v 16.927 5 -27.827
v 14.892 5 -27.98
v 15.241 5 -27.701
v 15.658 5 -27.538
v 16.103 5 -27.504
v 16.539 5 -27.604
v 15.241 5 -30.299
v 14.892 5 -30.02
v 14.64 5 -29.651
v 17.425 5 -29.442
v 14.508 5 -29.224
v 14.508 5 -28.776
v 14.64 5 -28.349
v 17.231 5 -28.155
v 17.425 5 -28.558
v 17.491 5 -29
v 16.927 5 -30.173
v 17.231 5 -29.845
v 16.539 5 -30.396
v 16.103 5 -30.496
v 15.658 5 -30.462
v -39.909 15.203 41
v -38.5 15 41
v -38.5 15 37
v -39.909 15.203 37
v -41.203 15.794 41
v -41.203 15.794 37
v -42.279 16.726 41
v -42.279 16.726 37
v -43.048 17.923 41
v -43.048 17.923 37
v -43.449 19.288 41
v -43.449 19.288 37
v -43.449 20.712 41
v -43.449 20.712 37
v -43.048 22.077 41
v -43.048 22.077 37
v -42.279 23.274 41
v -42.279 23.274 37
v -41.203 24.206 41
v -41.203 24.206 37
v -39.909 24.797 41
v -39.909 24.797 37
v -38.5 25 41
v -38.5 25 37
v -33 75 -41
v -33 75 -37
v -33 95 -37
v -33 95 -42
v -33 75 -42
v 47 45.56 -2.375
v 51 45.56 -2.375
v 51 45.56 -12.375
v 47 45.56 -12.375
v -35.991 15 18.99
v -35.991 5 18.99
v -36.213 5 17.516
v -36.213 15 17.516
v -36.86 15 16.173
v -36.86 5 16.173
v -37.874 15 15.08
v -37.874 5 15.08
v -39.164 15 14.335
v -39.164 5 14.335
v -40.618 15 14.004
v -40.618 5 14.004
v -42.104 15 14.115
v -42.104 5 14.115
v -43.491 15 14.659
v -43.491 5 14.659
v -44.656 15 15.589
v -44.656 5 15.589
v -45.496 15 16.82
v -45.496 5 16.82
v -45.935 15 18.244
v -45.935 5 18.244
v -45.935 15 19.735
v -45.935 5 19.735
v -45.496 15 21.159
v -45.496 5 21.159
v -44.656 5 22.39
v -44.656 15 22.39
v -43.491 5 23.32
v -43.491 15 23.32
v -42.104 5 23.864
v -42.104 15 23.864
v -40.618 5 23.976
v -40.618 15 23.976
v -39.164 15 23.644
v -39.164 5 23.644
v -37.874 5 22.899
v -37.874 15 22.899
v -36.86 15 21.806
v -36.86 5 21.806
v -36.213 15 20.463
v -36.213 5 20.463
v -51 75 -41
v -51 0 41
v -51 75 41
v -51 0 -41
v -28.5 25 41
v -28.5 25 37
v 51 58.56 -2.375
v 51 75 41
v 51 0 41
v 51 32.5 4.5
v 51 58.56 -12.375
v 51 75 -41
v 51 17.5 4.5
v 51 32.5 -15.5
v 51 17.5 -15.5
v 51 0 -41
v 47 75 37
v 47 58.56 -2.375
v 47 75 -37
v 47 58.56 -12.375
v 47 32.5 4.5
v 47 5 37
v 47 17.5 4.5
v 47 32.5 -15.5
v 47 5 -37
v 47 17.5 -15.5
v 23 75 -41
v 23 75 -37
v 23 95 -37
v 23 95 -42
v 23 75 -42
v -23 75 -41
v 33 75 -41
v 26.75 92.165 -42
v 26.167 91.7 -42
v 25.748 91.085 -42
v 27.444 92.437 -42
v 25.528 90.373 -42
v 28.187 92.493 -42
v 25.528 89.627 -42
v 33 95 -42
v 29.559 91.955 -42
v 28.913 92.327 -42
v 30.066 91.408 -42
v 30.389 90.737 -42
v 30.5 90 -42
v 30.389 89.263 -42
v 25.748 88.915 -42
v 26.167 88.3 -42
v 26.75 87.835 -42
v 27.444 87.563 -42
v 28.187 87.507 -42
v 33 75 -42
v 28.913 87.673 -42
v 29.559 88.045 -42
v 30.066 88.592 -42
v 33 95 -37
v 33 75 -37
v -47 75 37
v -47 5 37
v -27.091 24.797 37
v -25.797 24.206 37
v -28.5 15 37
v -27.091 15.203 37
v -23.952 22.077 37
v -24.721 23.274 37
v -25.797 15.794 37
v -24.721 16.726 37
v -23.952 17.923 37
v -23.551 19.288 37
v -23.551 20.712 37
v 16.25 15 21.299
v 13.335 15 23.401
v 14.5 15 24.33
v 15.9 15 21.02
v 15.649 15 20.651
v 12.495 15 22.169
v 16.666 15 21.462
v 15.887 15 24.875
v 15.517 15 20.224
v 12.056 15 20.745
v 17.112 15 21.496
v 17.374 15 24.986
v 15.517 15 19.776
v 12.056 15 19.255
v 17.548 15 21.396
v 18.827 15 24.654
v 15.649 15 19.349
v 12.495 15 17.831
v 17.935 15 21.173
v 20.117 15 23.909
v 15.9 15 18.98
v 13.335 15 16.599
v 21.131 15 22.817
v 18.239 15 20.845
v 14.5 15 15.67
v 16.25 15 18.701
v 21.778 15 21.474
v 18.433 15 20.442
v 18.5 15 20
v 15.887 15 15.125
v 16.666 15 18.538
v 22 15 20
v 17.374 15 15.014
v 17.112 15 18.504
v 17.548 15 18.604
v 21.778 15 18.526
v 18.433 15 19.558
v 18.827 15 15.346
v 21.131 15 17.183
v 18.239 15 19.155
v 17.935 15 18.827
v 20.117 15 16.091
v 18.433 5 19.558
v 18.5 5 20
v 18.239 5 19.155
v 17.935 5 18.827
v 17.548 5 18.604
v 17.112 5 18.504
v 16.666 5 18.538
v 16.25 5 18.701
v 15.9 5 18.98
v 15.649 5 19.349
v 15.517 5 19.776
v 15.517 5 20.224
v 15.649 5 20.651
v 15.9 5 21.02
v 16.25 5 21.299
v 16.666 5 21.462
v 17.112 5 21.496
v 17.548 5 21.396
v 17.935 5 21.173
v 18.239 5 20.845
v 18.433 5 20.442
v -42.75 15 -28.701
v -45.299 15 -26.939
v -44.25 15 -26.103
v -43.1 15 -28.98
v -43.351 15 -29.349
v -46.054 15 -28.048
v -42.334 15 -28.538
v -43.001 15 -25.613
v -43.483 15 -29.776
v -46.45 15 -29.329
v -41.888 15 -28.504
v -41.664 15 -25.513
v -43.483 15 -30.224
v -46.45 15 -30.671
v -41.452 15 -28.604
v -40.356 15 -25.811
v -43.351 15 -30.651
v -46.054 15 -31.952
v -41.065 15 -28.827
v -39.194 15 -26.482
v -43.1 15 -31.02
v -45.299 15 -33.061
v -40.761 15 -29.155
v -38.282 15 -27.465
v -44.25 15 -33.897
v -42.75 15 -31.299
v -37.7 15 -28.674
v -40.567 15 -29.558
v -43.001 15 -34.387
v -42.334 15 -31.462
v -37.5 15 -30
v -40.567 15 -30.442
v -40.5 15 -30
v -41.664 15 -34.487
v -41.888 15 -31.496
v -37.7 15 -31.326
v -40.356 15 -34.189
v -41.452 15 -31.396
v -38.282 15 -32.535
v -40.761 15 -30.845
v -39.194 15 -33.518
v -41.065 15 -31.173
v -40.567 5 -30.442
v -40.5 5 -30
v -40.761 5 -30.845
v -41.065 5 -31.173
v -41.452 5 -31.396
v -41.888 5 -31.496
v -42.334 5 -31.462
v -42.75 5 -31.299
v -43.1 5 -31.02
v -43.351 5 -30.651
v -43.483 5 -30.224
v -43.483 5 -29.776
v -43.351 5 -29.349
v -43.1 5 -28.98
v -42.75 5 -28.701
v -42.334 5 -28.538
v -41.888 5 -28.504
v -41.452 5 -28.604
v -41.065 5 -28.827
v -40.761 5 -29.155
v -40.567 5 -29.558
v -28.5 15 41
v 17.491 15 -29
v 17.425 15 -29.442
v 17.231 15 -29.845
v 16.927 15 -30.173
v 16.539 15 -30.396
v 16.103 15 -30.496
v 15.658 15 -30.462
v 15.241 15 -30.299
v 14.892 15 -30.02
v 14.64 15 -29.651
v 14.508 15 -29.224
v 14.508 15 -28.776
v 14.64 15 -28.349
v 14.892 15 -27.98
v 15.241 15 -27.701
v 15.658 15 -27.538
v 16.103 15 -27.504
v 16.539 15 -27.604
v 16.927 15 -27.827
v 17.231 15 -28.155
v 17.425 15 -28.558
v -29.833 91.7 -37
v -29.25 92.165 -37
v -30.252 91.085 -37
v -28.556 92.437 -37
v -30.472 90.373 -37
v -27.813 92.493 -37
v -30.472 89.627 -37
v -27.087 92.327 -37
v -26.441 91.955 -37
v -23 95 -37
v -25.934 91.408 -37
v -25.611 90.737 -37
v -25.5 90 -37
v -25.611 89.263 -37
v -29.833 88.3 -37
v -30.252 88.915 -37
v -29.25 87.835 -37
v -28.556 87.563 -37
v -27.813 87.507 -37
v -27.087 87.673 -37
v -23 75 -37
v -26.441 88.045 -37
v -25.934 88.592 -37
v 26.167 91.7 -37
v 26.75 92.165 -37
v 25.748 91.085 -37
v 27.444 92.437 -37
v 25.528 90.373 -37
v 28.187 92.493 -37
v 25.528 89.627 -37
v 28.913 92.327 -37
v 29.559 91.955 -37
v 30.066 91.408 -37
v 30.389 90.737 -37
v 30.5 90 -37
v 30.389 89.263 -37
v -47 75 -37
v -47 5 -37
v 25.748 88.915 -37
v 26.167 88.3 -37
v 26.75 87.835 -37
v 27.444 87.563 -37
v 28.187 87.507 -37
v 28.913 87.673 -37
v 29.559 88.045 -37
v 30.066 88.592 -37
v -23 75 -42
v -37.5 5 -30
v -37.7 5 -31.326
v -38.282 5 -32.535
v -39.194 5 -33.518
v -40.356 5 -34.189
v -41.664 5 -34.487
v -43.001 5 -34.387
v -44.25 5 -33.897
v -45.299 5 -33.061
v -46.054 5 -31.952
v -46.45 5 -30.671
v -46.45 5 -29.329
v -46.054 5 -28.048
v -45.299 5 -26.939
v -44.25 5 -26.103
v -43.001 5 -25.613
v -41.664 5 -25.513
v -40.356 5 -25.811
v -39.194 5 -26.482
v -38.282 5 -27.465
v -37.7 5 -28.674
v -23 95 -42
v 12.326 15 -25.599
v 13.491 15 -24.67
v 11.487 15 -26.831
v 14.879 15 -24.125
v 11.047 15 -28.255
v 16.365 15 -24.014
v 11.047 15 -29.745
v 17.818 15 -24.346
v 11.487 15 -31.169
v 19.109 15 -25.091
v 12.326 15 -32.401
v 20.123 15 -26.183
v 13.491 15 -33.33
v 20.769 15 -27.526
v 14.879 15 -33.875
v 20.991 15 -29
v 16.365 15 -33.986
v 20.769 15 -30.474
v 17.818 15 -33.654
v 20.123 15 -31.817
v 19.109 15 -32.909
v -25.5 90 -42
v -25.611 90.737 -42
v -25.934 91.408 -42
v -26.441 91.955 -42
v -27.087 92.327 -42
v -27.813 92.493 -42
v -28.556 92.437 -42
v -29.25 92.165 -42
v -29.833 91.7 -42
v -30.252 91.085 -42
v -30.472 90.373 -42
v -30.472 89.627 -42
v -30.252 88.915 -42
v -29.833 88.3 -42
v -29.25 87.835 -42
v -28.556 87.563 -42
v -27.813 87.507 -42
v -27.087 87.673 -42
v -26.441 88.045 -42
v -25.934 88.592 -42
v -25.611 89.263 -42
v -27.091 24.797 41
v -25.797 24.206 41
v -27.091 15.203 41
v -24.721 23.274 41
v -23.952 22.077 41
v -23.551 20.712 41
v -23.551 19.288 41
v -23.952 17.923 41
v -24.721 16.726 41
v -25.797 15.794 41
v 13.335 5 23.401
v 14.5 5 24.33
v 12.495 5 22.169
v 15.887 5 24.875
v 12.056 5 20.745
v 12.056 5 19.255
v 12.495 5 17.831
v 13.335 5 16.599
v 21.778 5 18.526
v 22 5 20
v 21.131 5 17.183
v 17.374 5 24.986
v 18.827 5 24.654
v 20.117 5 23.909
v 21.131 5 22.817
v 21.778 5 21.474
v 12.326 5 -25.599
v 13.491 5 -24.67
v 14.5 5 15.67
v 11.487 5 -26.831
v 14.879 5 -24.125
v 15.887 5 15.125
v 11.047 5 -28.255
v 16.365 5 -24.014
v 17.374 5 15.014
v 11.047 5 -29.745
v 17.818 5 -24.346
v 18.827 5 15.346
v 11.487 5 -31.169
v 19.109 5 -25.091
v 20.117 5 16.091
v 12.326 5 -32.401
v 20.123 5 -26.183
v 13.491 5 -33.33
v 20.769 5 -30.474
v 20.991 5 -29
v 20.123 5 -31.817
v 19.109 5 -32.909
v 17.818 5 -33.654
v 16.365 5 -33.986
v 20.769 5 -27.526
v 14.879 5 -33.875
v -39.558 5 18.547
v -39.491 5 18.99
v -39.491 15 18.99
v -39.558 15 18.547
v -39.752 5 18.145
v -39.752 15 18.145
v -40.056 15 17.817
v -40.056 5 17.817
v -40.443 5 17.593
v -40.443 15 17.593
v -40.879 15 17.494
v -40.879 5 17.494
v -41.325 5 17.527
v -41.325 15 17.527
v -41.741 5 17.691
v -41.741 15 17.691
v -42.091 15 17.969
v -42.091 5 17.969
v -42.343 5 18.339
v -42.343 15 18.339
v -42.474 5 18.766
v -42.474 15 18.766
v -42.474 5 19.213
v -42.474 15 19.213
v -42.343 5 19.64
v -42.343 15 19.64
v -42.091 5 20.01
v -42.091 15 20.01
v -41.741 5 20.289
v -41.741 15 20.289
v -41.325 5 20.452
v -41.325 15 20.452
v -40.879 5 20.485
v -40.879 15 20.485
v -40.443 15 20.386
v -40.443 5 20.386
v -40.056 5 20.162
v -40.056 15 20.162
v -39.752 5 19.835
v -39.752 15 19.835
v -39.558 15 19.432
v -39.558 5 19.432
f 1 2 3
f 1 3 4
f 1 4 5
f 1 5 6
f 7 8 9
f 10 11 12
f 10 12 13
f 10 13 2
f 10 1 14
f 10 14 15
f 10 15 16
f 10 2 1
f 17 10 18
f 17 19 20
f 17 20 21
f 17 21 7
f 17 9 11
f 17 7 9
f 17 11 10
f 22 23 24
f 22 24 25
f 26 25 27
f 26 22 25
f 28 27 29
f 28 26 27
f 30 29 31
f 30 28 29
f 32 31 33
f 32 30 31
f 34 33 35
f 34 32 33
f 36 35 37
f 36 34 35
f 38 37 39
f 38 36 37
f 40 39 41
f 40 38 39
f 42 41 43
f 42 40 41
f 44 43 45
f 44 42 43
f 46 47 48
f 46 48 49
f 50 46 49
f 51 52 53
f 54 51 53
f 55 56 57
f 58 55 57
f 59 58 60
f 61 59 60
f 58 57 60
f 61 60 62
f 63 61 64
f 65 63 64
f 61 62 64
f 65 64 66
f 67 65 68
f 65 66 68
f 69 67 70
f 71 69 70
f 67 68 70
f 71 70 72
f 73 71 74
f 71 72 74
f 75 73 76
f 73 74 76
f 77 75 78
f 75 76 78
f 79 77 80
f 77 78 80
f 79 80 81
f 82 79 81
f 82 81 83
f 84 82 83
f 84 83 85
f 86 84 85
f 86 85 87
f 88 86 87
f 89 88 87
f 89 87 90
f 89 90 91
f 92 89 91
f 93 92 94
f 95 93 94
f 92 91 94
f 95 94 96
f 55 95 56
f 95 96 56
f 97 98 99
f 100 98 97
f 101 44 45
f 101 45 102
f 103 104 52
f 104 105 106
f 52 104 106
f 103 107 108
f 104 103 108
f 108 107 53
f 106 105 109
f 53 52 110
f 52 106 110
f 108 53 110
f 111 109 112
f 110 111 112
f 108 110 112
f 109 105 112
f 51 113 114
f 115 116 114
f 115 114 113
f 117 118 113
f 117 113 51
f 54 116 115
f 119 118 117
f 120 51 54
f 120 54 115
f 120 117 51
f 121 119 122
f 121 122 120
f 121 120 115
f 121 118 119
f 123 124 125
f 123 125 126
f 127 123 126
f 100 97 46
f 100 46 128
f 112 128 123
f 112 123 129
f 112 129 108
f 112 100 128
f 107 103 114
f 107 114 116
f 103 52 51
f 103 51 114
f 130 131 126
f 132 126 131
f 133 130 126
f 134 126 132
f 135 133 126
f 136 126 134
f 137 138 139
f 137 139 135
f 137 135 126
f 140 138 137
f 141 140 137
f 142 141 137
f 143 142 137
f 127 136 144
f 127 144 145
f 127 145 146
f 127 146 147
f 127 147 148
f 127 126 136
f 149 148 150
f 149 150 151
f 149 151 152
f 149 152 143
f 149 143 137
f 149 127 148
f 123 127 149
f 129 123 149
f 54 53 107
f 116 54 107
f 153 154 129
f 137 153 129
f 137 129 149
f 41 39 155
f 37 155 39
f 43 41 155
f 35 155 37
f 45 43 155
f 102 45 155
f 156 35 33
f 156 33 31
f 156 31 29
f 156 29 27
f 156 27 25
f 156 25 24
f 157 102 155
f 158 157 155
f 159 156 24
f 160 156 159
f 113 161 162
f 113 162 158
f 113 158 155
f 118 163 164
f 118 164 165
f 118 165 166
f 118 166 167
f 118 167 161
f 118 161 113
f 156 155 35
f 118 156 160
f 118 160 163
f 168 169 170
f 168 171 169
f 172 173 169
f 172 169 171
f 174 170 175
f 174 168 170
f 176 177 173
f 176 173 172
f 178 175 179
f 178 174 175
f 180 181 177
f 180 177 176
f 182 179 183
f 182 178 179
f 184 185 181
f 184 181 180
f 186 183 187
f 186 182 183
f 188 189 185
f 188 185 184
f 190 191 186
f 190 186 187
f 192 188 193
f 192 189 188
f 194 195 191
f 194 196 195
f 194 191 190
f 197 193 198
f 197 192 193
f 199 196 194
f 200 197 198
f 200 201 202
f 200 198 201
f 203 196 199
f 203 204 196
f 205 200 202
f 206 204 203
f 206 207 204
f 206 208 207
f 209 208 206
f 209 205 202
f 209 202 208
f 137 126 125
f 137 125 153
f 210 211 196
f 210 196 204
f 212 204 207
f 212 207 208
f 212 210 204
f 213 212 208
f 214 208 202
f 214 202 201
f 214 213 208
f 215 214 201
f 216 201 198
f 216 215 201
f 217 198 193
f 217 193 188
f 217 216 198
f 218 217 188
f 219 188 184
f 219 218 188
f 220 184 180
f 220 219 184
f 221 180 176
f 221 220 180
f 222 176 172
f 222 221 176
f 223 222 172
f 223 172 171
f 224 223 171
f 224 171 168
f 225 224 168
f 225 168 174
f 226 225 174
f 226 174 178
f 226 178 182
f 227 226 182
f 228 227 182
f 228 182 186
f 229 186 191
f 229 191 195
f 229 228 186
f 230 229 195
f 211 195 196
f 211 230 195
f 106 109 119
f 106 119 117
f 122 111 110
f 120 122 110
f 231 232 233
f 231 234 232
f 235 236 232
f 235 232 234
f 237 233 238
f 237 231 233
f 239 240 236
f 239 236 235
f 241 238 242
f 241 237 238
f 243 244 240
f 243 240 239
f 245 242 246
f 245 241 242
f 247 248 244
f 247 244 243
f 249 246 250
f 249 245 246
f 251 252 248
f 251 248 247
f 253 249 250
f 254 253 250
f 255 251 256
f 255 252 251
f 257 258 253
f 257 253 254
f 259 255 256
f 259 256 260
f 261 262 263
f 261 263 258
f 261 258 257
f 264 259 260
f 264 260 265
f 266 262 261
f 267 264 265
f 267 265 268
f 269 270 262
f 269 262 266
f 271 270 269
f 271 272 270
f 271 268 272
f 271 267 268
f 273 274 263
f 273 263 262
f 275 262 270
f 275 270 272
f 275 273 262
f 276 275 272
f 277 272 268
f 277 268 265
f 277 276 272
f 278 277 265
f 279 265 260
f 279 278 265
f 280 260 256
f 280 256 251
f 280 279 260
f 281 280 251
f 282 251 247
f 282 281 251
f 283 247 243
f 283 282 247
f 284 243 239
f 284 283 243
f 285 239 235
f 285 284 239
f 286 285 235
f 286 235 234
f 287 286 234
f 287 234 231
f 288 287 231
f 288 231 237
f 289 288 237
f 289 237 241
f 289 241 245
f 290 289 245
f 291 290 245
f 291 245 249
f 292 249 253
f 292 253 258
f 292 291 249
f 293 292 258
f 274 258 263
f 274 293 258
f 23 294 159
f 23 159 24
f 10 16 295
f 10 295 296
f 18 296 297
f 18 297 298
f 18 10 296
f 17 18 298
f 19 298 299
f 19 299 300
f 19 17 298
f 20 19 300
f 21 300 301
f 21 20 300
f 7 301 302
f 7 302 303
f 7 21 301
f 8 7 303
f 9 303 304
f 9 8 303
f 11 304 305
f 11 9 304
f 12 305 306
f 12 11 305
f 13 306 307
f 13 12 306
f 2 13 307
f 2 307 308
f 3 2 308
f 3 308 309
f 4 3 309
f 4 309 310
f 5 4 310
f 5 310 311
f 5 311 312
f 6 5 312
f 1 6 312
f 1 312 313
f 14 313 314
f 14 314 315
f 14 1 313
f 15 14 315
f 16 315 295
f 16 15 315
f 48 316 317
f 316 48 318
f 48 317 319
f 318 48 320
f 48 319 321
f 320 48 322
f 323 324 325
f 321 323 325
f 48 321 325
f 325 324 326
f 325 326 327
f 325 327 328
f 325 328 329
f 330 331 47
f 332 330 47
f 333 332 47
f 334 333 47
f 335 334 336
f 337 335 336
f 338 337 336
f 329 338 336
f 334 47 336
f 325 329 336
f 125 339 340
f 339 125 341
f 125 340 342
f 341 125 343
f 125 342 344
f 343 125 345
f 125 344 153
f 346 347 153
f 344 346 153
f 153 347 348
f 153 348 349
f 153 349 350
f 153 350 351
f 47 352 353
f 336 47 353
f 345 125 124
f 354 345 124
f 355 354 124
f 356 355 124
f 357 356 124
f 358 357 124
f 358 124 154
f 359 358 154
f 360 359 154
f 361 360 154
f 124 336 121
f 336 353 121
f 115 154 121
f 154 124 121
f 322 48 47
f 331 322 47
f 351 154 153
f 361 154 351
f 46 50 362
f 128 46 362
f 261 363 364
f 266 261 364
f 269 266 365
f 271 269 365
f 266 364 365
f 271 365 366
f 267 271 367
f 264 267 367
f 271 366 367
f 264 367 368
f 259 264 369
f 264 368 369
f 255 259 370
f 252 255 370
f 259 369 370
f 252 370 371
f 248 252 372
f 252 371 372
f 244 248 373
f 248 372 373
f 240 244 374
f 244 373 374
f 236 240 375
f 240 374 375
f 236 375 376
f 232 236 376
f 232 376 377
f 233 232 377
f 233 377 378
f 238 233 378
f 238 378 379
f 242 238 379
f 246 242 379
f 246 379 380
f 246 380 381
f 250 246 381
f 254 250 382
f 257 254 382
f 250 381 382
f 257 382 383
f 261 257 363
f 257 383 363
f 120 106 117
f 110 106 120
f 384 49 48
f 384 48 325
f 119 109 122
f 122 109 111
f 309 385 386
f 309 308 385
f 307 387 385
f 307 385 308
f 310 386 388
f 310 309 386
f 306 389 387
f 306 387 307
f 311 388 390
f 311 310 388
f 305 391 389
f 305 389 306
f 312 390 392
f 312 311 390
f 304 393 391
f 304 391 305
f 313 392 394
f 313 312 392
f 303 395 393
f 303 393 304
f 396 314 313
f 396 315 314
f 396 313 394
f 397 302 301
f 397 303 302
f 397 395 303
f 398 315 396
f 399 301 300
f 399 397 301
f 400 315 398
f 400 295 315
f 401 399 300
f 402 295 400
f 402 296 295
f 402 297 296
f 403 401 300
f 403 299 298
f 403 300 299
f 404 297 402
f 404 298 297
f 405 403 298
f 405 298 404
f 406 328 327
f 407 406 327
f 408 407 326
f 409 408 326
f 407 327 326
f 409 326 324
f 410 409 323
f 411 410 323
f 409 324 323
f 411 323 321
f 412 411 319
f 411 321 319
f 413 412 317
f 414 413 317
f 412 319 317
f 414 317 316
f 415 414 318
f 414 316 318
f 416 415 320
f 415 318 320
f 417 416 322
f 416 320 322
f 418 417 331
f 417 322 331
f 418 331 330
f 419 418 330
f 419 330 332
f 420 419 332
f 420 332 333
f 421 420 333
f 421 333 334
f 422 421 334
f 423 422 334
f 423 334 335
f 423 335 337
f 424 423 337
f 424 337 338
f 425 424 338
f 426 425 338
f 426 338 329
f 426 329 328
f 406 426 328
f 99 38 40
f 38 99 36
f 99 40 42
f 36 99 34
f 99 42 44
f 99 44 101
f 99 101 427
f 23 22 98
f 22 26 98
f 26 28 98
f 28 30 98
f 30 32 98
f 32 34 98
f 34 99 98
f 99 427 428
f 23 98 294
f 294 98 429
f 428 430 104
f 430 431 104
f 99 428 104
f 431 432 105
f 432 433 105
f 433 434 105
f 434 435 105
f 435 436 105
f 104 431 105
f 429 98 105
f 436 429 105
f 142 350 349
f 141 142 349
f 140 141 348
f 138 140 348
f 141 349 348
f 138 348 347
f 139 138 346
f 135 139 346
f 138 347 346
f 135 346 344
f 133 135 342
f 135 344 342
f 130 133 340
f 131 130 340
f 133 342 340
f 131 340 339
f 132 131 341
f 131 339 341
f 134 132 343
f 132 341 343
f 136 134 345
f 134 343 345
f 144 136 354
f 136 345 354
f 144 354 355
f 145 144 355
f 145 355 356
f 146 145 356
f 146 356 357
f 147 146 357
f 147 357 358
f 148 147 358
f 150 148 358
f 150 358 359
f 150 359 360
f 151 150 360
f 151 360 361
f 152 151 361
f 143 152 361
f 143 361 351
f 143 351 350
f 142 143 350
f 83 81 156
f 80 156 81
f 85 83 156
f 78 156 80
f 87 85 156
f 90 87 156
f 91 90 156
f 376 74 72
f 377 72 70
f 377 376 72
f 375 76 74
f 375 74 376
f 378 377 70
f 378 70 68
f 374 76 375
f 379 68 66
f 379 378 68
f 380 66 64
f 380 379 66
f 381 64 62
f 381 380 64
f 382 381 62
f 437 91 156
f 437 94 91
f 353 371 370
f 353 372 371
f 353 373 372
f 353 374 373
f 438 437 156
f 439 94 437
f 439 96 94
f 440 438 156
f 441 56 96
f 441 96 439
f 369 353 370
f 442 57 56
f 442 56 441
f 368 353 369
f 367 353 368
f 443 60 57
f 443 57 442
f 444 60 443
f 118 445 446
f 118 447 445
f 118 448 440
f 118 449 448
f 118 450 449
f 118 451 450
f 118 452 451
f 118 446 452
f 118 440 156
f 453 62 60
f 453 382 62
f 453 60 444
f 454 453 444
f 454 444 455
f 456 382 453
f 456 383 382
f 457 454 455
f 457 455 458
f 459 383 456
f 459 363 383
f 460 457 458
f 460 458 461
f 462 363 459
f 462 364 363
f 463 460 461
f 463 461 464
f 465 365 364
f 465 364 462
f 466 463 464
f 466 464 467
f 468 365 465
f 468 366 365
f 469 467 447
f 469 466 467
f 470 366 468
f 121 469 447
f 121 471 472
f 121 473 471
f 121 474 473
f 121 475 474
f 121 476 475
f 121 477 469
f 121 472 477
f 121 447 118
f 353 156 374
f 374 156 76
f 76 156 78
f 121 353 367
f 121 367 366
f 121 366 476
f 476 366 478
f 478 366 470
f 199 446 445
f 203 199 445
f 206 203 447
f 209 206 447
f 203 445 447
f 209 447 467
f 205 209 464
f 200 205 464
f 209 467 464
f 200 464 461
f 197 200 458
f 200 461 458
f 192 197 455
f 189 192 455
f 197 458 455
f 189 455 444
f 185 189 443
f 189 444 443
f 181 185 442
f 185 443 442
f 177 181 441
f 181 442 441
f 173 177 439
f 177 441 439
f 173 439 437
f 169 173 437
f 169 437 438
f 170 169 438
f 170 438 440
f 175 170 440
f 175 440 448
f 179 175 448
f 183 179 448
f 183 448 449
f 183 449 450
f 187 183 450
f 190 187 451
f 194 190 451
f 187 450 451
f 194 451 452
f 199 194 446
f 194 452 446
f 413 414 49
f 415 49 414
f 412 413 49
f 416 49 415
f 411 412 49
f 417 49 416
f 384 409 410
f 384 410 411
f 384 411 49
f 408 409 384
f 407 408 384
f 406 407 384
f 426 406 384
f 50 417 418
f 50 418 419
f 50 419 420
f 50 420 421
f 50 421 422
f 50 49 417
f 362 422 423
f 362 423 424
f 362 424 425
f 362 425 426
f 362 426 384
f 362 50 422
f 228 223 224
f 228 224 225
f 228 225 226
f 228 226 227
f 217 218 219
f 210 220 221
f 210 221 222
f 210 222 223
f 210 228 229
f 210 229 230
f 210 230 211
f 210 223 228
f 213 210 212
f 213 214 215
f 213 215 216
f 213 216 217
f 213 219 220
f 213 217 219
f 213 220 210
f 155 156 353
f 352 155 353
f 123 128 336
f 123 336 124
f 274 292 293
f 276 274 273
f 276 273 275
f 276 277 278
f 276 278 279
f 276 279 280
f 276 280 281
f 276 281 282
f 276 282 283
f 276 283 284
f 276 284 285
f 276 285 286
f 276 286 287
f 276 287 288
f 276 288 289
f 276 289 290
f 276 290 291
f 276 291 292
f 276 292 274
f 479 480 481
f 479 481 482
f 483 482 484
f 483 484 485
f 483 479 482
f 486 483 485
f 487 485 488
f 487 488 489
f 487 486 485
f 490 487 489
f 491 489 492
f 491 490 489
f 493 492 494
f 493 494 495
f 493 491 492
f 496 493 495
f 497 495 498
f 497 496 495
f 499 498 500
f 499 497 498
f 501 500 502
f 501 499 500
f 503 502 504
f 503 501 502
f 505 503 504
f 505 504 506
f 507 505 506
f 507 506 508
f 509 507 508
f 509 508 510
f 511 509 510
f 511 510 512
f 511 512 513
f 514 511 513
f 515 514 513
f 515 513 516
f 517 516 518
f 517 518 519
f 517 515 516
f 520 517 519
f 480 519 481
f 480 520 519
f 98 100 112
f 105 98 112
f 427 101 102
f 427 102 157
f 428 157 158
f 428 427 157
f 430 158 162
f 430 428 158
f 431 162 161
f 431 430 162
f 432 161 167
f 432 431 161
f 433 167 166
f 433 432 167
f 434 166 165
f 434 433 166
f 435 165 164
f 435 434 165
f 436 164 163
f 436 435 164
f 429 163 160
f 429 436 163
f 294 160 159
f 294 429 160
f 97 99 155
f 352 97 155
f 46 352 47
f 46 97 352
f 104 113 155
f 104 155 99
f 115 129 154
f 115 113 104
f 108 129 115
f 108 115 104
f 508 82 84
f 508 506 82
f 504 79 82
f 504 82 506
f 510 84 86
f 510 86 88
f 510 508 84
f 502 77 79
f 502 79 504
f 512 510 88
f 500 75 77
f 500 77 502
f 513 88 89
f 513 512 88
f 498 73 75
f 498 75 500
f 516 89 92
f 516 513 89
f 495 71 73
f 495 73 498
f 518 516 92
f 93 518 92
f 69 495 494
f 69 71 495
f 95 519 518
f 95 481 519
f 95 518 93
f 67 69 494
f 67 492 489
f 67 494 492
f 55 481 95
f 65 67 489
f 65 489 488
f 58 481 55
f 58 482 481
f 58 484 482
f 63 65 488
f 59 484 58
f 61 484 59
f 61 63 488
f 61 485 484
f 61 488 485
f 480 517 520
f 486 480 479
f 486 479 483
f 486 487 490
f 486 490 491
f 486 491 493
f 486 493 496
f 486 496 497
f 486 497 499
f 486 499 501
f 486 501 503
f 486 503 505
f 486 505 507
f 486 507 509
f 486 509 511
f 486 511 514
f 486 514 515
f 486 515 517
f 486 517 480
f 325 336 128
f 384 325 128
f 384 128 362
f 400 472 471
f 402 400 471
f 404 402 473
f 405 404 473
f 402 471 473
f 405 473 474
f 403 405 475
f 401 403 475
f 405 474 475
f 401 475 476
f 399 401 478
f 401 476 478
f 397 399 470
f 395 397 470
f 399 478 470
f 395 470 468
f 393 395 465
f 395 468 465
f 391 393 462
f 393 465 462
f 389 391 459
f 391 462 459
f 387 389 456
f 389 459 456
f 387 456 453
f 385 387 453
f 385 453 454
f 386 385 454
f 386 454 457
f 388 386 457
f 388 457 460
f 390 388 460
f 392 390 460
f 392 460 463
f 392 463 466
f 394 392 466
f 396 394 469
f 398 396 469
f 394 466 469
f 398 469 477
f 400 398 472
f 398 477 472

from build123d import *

# Parameters (mm, degrees)
SKETCH1_W           = 102
SKETCH1_H           = 82
BOSS_EXTRUDE1_DEPTH = 5
SKETCH2_W           = 102
SKETCH2_H           = 82
SKETCH2_W_2         = 94
SKETCH2_H_2         = 74
BOSS_EXTRUDE2_DEPTH = 70
CUT_EXTRUDE1_REACH  = 84
SKETCH9_W           = 20
SKETCH9_H           = 15
SKETCH9_W_2         = 10
SKETCH9_H_2         = 13
CUT_EXTRUDE7_DEPTH  = 10
SKETCH10_R          = 5
SKETCH10_R_2        = 4.5
BOSS_EXTRUDE5_DEPTH = 10
SKETCH11_R          = 1.5
CUT_EXTRUDE8_DEPTH  = 10
SKETCH13_W          = 10
SKETCH13_H          = 5
BOSS_EXTRUDE6_DEPTH = 20
SKETCH14_R          = 2.5
CUT_EXTRUDE9_DEPTH  = 10


with BuildPart() as part:
    # Sketch1 → Boss-Extrude1 (new body)
    with BuildSketch(Plane(origin=(0, 0, 0), x_dir=(1, 0, 0), z_dir=(0, 1, 0))):
        Rectangle(SKETCH1_W, SKETCH1_H)
    extrude(amount=BOSS_EXTRUDE1_DEPTH)

    # Sketch2 → Boss-Extrude2 (add)
    with BuildSketch(Plane(origin=(0, 5, 0), x_dir=(1, 0, 0), z_dir=(0, 1, 0))):
        Rectangle(SKETCH2_W, SKETCH2_H)
        Rectangle(SKETCH2_W_2, SKETCH2_H_2, mode=Mode.SUBTRACT)
    extrude(amount=BOSS_EXTRUDE2_DEPTH)

    # Sketch4 → Cut-Extrude1 (cut, up to next)
    with BuildSketch(Plane.XY.offset(41), mode=Mode.PRIVATE) as cut_extrude1_sk1:
        with BuildLine():
            Line((-38.5, 25), (-28.5, 25))
            ThreePointArc((-28.5, 25), (-23.5, 20), (-28.5, 15))
            Line((-28.5, 15), (-38.5, 15))
            ThreePointArc((-38.5, 15), (-43.5, 20), (-38.5, 25))
        make_face()
    cut_extrude1_tool1 = extrude(cut_extrude1_sk1.sketch, amount=-CUT_EXTRUDE1_REACH, mode=Mode.PRIVATE) & part.part
    add(cut_extrude1_tool1.solids().sort_by_distance((-33.5, 20, 41))[0], mode=Mode.SUBTRACT)

    # Sketch9 → Cut-Extrude7 (cut)
    with BuildSketch(Plane(origin=(51, 0, 0), x_dir=(0, 0, -1), z_dir=(1, 0, 0))):
        with Locations((5.5, 25)):
            Rectangle(SKETCH9_W, SKETCH9_H)
        with Locations((7.375245753, 52.06044871)):
            Rectangle(SKETCH9_W_2, SKETCH9_H_2)
    extrude(amount=-CUT_EXTRUDE7_DEPTH, mode=Mode.SUBTRACT)

    # Sketch10 → Boss-Extrude5 (add)
    with BuildSketch(Plane(origin=(0, 5, 0), x_dir=(1, 0, 0), z_dir=(0, 1, 0))):
        with Locations((17, -20)):
            Circle(SKETCH10_R)
        with Locations((-40.991198651, -18.989614408)):
            Circle(SKETCH10_R)
        with Locations((15.99137867, 29)):
            Circle(SKETCH10_R)
        with Locations((-42, 30)):
            Circle(SKETCH10_R_2)
    extrude(amount=BOSS_EXTRUDE5_DEPTH)

    # Sketch11 → Cut-Extrude8 (cut)
    with BuildSketch(Plane(origin=(0, 5, 0), x_dir=(1, 0, 0), z_dir=(0, 1, 0))):
        with Locations((-42, 30)):
            Circle(SKETCH11_R)
        with Locations((15.99137867, 29)):
            Circle(SKETCH11_R)
        with Locations((-40.991198651, -18.989614408)):
            Circle(SKETCH11_R)
        with Locations((17, -20)):
            Circle(SKETCH11_R)
    extrude(amount=CUT_EXTRUDE8_DEPTH, mode=Mode.SUBTRACT)

    # Sketch13 → Boss-Extrude6 (add)
    with BuildSketch(Plane(origin=(0, 75, 0), x_dir=(1, 0, 0), z_dir=(0, 1, 0))):
        with Locations((-28, 39.5)):
            Rectangle(SKETCH13_W, SKETCH13_H)
        with Locations((28, 39.5)):
            Rectangle(SKETCH13_W, SKETCH13_H)
    extrude(amount=BOSS_EXTRUDE6_DEPTH)

    # Sketch14 → Cut-Extrude9 (cut)
    with BuildSketch(Plane.XY.offset(-37)):
        with Locations((-28, 90)):
            Circle(SKETCH14_R)
        with Locations((28, 90)):
            Circle(SKETCH14_R)
    extrude(amount=-CUT_EXTRUDE9_DEPTH, mode=Mode.SUBTRACT)


solid = part.part
